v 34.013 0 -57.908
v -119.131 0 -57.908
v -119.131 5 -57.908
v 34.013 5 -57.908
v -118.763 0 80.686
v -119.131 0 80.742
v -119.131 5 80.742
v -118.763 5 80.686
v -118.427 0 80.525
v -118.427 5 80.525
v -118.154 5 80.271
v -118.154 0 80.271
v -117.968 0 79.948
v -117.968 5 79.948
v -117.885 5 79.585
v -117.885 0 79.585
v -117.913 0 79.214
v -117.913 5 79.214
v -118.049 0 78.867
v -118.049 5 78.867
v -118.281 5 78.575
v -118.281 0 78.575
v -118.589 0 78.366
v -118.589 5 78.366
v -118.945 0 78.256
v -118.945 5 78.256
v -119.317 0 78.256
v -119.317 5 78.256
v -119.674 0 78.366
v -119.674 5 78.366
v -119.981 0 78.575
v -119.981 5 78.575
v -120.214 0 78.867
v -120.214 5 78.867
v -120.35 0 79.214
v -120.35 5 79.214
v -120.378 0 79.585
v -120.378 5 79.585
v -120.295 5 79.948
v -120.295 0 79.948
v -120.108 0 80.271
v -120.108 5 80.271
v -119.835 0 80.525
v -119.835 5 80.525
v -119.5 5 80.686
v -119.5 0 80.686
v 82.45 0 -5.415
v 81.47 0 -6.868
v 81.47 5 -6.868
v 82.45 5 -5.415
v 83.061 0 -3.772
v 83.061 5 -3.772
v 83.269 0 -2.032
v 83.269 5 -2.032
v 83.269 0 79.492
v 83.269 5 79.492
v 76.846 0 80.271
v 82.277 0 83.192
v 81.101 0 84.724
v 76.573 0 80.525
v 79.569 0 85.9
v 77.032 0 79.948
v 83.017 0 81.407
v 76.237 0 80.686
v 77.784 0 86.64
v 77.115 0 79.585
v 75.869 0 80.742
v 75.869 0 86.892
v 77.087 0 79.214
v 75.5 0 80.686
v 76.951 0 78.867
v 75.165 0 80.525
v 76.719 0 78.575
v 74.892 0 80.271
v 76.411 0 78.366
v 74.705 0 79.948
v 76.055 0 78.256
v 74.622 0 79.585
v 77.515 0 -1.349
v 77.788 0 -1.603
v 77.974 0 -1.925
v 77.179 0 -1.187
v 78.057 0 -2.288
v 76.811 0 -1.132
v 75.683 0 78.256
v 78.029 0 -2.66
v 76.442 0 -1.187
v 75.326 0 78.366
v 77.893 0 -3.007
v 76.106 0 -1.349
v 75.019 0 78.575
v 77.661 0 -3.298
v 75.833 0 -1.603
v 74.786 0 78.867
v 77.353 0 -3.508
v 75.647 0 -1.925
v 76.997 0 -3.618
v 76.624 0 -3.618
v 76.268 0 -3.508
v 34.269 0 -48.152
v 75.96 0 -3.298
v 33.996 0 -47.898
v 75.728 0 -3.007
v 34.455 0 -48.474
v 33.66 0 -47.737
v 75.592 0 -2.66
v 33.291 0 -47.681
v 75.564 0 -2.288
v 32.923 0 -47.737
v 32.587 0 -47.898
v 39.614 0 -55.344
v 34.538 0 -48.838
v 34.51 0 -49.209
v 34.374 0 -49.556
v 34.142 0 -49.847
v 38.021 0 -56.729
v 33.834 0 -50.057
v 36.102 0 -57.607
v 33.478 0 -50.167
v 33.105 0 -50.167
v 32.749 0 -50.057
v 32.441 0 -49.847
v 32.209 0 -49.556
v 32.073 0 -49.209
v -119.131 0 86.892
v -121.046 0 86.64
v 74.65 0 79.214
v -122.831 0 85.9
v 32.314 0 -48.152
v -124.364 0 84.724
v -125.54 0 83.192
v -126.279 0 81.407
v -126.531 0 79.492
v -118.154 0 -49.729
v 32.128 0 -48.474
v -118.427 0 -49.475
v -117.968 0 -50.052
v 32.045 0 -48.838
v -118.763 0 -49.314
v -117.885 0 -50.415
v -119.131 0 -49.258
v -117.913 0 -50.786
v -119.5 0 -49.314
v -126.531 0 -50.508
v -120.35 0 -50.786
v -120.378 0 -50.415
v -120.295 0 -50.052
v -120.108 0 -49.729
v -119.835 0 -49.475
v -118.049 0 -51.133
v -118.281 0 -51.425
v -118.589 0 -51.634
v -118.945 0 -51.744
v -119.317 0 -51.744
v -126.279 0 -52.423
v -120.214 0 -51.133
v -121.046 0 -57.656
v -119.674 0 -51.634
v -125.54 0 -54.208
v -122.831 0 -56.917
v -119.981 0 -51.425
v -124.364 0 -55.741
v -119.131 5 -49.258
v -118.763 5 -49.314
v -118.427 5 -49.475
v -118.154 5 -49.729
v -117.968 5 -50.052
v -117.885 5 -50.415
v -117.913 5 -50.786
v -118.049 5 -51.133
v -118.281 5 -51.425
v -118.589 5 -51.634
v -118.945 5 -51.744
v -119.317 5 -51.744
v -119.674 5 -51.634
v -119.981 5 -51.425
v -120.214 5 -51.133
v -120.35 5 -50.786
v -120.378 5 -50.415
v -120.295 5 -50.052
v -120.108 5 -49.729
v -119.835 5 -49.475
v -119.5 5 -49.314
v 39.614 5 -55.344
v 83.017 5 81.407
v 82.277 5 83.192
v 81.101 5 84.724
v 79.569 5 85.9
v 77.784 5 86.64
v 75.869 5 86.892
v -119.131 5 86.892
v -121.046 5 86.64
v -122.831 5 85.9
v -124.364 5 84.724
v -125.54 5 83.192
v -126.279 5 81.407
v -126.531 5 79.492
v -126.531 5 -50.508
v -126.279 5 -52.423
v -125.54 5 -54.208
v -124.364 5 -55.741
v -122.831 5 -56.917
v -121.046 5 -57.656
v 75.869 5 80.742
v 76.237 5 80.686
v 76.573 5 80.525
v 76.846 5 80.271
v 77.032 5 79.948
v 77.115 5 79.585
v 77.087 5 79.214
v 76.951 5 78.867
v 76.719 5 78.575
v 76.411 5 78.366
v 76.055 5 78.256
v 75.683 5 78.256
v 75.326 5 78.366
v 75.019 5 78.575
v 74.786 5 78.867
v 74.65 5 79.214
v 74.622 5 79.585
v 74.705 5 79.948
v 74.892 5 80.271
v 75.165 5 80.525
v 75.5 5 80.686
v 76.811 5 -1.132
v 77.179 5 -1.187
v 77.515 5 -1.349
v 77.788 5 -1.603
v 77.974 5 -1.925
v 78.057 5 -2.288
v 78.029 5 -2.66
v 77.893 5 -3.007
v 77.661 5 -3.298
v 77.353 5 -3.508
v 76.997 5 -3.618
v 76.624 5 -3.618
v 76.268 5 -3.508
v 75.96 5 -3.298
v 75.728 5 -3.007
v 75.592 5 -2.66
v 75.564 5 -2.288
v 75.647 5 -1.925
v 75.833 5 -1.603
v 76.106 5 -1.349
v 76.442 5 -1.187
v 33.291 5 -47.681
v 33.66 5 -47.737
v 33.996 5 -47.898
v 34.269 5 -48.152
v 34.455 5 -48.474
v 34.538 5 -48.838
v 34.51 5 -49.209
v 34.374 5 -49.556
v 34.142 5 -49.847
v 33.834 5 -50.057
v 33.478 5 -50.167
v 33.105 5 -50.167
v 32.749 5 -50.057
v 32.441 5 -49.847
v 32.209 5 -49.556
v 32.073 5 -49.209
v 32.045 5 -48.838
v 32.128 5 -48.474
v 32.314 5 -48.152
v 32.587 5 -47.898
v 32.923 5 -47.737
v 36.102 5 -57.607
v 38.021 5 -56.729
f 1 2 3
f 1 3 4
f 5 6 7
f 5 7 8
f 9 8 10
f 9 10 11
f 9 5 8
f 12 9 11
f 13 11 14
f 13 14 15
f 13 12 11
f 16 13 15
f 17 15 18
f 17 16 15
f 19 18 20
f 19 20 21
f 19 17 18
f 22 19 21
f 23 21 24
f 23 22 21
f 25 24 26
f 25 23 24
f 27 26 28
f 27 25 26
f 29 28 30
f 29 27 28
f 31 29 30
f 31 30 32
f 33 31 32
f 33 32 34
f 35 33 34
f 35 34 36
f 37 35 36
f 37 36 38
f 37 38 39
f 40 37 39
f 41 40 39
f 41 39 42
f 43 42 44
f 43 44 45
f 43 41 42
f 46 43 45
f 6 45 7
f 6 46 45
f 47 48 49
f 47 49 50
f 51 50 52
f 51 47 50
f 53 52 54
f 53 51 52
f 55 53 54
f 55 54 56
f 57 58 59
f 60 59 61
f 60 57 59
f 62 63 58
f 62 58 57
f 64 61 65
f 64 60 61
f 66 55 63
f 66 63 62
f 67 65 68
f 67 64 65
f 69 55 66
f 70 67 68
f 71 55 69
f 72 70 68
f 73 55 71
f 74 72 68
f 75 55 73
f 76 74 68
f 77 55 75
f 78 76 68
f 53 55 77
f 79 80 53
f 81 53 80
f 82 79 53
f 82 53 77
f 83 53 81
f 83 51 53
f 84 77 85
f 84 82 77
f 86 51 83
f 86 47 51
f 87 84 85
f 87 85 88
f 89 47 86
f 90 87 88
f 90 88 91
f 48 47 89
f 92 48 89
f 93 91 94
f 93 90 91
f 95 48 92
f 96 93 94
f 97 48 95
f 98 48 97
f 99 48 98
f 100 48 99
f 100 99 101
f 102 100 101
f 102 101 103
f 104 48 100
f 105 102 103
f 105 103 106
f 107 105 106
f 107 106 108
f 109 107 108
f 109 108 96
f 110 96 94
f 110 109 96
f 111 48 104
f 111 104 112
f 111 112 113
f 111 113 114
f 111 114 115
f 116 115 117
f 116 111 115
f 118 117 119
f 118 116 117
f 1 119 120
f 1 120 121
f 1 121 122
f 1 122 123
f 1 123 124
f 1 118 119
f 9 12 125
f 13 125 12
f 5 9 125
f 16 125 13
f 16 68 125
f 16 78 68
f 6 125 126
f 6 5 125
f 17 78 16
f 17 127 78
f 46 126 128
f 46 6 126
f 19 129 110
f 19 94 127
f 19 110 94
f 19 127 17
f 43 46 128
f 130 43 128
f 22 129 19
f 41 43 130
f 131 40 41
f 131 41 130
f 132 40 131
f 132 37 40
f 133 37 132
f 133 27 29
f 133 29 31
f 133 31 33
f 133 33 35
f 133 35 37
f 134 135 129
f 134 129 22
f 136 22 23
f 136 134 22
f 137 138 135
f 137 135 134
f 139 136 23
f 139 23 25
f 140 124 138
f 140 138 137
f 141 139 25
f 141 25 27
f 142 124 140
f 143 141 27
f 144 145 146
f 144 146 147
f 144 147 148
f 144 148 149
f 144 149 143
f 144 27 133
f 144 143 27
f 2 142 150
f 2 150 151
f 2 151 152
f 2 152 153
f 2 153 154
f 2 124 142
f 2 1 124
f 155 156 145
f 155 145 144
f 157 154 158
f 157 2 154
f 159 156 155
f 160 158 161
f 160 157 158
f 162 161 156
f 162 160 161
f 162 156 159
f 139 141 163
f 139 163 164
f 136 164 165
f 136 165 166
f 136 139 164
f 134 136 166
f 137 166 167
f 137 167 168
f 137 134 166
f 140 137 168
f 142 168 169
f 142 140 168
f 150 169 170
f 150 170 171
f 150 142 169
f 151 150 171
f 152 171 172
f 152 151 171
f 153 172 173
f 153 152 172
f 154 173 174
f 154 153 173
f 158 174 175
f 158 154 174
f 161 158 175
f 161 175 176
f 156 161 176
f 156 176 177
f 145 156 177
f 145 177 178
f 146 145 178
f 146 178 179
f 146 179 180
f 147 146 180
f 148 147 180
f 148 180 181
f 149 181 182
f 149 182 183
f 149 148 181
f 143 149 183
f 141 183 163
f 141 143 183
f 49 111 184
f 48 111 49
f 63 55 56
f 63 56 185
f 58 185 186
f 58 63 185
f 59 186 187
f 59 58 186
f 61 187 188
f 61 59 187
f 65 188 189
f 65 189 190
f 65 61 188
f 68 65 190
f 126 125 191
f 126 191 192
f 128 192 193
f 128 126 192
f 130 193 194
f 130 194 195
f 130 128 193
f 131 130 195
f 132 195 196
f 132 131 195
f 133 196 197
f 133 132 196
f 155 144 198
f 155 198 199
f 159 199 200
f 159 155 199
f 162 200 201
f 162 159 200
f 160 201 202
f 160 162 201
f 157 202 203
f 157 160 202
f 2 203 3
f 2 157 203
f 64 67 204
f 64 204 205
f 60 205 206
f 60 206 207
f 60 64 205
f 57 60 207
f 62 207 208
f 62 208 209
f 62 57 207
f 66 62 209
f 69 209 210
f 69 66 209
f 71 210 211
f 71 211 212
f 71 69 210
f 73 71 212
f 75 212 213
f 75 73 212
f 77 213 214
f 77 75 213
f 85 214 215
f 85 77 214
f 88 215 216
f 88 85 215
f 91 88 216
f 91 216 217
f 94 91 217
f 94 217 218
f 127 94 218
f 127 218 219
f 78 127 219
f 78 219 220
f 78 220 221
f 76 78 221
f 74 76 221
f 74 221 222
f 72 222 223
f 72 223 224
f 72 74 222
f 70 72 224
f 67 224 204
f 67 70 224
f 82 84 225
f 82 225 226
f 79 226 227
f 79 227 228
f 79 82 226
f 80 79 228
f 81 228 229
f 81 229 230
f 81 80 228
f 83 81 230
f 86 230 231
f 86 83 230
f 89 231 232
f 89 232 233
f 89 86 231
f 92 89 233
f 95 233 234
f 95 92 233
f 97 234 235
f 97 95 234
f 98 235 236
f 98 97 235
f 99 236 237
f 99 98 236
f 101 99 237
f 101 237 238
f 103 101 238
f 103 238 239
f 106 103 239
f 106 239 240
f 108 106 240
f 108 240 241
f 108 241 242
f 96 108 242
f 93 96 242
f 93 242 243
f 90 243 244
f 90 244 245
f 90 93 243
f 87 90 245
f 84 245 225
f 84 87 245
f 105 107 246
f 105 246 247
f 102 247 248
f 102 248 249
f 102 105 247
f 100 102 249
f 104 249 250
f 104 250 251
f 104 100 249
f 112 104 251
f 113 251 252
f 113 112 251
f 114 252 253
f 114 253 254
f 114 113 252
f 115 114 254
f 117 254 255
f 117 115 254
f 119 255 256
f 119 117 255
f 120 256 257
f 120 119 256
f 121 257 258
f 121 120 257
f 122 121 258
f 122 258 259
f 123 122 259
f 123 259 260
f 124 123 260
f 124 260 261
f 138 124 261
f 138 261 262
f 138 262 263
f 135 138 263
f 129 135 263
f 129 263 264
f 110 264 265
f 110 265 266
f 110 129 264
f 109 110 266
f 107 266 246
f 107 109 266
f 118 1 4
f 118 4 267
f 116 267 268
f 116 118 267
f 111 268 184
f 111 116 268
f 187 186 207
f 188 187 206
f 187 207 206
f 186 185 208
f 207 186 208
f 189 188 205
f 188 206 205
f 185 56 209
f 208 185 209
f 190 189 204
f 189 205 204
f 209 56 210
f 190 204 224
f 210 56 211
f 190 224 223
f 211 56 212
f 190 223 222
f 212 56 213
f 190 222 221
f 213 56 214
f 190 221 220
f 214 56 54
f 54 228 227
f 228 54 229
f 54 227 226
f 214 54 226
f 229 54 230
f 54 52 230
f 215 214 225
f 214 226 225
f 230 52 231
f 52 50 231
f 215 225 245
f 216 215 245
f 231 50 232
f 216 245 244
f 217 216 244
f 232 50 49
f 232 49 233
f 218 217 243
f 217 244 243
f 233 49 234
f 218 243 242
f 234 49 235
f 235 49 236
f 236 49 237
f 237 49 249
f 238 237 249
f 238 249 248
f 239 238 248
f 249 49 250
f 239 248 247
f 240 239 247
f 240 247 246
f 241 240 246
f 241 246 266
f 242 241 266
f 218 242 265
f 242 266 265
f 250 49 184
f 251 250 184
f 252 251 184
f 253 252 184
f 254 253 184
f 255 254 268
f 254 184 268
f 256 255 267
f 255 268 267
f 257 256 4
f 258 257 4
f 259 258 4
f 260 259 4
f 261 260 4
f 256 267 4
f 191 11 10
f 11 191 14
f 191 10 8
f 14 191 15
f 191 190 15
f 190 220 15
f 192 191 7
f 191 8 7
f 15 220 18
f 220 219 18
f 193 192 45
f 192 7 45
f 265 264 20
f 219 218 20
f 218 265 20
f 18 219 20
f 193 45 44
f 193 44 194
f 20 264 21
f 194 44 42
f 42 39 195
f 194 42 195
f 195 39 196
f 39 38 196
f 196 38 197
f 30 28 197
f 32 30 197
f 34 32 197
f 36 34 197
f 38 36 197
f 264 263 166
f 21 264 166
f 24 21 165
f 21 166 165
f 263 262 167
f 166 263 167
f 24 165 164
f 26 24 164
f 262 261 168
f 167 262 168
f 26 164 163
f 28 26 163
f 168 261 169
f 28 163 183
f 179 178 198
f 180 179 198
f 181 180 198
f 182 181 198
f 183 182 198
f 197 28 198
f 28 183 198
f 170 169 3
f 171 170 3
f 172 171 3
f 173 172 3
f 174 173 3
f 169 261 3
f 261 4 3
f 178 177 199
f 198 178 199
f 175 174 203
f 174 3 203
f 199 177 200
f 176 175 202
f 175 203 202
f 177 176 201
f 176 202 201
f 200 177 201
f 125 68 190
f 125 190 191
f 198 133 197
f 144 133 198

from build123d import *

# Parameters (mm, degrees)
SKETCH_2_R      = 1.25
EXTRUDE_1_DEPTH = 5


with BuildPart() as part:
    # 草图2 → 凸台-拉伸1 (new body)
    with BuildSketch(Plane(origin=(0, 0, 0), x_dir=(1, 0, 0), z_dir=(0, 1, 0))):
        with BuildLine():
            Line((-119.131169622, 57.908224798), (34.013330694, 57.908224798))
            ThreePointArc((34.013330694, 57.908224798), (37.09334763, 57.236783015), (39.614431575, 55.344304711))
            Line((39.614431575, 55.344304711), (81.469931259, 6.86767066))
            ThreePointArc((81.469931259, 6.86767066), (82.804540382, 4.611499029), (83.268830378, 2.031590747))
            Line((83.268830378, 2.031590747), (83.268830378, -79.491775202))
            ThreePointArc((83.268830378, -79.491775202), (81.101420559, -84.724365382), (75.868830378, -86.891775202))
            Line((75.868830378, -86.891775202), (-119.131169622, -86.891775202))
            ThreePointArc((-119.131169622, -86.891775202), (-124.363759802, -84.724365382), (-126.531169622, -79.491775202))
            Line((-126.531169622, -79.491775202), (-126.531169622, 50.508224798))
            ThreePointArc((-126.531169622, 50.508224798), (-124.363759802, 55.740814979), (-119.131169622, 57.908224798))
        make_face()
        with Locations(Location((76.810606689, 2.381907658, 0), (0, 0, 270))):
            Circle(SKETCH_2_R, mode=Mode.SUBTRACT)
        with Locations(Location((33.291419632, 48.931148856, 0), (0, 0, 270))):
            Circle(SKETCH_2_R, mode=Mode.SUBTRACT)
        with Locations(Location((-119.131169622, 50.508224798, 0), (0, 0, 270))):
            Circle(SKETCH_2_R, mode=Mode.SUBTRACT)
        with Locations(Location((-119.131169622, -79.491775202, 0), (0, 0, 270))):
            Circle(SKETCH_2_R, mode=Mode.SUBTRACT)
        with Locations(Location((75.868830378, -79.491775202, 0), (0, 0, 270))):
            Circle(SKETCH_2_R, mode=Mode.SUBTRACT)
    extrude(amount=EXTRUDE_1_DEPTH)


solid = part.part
